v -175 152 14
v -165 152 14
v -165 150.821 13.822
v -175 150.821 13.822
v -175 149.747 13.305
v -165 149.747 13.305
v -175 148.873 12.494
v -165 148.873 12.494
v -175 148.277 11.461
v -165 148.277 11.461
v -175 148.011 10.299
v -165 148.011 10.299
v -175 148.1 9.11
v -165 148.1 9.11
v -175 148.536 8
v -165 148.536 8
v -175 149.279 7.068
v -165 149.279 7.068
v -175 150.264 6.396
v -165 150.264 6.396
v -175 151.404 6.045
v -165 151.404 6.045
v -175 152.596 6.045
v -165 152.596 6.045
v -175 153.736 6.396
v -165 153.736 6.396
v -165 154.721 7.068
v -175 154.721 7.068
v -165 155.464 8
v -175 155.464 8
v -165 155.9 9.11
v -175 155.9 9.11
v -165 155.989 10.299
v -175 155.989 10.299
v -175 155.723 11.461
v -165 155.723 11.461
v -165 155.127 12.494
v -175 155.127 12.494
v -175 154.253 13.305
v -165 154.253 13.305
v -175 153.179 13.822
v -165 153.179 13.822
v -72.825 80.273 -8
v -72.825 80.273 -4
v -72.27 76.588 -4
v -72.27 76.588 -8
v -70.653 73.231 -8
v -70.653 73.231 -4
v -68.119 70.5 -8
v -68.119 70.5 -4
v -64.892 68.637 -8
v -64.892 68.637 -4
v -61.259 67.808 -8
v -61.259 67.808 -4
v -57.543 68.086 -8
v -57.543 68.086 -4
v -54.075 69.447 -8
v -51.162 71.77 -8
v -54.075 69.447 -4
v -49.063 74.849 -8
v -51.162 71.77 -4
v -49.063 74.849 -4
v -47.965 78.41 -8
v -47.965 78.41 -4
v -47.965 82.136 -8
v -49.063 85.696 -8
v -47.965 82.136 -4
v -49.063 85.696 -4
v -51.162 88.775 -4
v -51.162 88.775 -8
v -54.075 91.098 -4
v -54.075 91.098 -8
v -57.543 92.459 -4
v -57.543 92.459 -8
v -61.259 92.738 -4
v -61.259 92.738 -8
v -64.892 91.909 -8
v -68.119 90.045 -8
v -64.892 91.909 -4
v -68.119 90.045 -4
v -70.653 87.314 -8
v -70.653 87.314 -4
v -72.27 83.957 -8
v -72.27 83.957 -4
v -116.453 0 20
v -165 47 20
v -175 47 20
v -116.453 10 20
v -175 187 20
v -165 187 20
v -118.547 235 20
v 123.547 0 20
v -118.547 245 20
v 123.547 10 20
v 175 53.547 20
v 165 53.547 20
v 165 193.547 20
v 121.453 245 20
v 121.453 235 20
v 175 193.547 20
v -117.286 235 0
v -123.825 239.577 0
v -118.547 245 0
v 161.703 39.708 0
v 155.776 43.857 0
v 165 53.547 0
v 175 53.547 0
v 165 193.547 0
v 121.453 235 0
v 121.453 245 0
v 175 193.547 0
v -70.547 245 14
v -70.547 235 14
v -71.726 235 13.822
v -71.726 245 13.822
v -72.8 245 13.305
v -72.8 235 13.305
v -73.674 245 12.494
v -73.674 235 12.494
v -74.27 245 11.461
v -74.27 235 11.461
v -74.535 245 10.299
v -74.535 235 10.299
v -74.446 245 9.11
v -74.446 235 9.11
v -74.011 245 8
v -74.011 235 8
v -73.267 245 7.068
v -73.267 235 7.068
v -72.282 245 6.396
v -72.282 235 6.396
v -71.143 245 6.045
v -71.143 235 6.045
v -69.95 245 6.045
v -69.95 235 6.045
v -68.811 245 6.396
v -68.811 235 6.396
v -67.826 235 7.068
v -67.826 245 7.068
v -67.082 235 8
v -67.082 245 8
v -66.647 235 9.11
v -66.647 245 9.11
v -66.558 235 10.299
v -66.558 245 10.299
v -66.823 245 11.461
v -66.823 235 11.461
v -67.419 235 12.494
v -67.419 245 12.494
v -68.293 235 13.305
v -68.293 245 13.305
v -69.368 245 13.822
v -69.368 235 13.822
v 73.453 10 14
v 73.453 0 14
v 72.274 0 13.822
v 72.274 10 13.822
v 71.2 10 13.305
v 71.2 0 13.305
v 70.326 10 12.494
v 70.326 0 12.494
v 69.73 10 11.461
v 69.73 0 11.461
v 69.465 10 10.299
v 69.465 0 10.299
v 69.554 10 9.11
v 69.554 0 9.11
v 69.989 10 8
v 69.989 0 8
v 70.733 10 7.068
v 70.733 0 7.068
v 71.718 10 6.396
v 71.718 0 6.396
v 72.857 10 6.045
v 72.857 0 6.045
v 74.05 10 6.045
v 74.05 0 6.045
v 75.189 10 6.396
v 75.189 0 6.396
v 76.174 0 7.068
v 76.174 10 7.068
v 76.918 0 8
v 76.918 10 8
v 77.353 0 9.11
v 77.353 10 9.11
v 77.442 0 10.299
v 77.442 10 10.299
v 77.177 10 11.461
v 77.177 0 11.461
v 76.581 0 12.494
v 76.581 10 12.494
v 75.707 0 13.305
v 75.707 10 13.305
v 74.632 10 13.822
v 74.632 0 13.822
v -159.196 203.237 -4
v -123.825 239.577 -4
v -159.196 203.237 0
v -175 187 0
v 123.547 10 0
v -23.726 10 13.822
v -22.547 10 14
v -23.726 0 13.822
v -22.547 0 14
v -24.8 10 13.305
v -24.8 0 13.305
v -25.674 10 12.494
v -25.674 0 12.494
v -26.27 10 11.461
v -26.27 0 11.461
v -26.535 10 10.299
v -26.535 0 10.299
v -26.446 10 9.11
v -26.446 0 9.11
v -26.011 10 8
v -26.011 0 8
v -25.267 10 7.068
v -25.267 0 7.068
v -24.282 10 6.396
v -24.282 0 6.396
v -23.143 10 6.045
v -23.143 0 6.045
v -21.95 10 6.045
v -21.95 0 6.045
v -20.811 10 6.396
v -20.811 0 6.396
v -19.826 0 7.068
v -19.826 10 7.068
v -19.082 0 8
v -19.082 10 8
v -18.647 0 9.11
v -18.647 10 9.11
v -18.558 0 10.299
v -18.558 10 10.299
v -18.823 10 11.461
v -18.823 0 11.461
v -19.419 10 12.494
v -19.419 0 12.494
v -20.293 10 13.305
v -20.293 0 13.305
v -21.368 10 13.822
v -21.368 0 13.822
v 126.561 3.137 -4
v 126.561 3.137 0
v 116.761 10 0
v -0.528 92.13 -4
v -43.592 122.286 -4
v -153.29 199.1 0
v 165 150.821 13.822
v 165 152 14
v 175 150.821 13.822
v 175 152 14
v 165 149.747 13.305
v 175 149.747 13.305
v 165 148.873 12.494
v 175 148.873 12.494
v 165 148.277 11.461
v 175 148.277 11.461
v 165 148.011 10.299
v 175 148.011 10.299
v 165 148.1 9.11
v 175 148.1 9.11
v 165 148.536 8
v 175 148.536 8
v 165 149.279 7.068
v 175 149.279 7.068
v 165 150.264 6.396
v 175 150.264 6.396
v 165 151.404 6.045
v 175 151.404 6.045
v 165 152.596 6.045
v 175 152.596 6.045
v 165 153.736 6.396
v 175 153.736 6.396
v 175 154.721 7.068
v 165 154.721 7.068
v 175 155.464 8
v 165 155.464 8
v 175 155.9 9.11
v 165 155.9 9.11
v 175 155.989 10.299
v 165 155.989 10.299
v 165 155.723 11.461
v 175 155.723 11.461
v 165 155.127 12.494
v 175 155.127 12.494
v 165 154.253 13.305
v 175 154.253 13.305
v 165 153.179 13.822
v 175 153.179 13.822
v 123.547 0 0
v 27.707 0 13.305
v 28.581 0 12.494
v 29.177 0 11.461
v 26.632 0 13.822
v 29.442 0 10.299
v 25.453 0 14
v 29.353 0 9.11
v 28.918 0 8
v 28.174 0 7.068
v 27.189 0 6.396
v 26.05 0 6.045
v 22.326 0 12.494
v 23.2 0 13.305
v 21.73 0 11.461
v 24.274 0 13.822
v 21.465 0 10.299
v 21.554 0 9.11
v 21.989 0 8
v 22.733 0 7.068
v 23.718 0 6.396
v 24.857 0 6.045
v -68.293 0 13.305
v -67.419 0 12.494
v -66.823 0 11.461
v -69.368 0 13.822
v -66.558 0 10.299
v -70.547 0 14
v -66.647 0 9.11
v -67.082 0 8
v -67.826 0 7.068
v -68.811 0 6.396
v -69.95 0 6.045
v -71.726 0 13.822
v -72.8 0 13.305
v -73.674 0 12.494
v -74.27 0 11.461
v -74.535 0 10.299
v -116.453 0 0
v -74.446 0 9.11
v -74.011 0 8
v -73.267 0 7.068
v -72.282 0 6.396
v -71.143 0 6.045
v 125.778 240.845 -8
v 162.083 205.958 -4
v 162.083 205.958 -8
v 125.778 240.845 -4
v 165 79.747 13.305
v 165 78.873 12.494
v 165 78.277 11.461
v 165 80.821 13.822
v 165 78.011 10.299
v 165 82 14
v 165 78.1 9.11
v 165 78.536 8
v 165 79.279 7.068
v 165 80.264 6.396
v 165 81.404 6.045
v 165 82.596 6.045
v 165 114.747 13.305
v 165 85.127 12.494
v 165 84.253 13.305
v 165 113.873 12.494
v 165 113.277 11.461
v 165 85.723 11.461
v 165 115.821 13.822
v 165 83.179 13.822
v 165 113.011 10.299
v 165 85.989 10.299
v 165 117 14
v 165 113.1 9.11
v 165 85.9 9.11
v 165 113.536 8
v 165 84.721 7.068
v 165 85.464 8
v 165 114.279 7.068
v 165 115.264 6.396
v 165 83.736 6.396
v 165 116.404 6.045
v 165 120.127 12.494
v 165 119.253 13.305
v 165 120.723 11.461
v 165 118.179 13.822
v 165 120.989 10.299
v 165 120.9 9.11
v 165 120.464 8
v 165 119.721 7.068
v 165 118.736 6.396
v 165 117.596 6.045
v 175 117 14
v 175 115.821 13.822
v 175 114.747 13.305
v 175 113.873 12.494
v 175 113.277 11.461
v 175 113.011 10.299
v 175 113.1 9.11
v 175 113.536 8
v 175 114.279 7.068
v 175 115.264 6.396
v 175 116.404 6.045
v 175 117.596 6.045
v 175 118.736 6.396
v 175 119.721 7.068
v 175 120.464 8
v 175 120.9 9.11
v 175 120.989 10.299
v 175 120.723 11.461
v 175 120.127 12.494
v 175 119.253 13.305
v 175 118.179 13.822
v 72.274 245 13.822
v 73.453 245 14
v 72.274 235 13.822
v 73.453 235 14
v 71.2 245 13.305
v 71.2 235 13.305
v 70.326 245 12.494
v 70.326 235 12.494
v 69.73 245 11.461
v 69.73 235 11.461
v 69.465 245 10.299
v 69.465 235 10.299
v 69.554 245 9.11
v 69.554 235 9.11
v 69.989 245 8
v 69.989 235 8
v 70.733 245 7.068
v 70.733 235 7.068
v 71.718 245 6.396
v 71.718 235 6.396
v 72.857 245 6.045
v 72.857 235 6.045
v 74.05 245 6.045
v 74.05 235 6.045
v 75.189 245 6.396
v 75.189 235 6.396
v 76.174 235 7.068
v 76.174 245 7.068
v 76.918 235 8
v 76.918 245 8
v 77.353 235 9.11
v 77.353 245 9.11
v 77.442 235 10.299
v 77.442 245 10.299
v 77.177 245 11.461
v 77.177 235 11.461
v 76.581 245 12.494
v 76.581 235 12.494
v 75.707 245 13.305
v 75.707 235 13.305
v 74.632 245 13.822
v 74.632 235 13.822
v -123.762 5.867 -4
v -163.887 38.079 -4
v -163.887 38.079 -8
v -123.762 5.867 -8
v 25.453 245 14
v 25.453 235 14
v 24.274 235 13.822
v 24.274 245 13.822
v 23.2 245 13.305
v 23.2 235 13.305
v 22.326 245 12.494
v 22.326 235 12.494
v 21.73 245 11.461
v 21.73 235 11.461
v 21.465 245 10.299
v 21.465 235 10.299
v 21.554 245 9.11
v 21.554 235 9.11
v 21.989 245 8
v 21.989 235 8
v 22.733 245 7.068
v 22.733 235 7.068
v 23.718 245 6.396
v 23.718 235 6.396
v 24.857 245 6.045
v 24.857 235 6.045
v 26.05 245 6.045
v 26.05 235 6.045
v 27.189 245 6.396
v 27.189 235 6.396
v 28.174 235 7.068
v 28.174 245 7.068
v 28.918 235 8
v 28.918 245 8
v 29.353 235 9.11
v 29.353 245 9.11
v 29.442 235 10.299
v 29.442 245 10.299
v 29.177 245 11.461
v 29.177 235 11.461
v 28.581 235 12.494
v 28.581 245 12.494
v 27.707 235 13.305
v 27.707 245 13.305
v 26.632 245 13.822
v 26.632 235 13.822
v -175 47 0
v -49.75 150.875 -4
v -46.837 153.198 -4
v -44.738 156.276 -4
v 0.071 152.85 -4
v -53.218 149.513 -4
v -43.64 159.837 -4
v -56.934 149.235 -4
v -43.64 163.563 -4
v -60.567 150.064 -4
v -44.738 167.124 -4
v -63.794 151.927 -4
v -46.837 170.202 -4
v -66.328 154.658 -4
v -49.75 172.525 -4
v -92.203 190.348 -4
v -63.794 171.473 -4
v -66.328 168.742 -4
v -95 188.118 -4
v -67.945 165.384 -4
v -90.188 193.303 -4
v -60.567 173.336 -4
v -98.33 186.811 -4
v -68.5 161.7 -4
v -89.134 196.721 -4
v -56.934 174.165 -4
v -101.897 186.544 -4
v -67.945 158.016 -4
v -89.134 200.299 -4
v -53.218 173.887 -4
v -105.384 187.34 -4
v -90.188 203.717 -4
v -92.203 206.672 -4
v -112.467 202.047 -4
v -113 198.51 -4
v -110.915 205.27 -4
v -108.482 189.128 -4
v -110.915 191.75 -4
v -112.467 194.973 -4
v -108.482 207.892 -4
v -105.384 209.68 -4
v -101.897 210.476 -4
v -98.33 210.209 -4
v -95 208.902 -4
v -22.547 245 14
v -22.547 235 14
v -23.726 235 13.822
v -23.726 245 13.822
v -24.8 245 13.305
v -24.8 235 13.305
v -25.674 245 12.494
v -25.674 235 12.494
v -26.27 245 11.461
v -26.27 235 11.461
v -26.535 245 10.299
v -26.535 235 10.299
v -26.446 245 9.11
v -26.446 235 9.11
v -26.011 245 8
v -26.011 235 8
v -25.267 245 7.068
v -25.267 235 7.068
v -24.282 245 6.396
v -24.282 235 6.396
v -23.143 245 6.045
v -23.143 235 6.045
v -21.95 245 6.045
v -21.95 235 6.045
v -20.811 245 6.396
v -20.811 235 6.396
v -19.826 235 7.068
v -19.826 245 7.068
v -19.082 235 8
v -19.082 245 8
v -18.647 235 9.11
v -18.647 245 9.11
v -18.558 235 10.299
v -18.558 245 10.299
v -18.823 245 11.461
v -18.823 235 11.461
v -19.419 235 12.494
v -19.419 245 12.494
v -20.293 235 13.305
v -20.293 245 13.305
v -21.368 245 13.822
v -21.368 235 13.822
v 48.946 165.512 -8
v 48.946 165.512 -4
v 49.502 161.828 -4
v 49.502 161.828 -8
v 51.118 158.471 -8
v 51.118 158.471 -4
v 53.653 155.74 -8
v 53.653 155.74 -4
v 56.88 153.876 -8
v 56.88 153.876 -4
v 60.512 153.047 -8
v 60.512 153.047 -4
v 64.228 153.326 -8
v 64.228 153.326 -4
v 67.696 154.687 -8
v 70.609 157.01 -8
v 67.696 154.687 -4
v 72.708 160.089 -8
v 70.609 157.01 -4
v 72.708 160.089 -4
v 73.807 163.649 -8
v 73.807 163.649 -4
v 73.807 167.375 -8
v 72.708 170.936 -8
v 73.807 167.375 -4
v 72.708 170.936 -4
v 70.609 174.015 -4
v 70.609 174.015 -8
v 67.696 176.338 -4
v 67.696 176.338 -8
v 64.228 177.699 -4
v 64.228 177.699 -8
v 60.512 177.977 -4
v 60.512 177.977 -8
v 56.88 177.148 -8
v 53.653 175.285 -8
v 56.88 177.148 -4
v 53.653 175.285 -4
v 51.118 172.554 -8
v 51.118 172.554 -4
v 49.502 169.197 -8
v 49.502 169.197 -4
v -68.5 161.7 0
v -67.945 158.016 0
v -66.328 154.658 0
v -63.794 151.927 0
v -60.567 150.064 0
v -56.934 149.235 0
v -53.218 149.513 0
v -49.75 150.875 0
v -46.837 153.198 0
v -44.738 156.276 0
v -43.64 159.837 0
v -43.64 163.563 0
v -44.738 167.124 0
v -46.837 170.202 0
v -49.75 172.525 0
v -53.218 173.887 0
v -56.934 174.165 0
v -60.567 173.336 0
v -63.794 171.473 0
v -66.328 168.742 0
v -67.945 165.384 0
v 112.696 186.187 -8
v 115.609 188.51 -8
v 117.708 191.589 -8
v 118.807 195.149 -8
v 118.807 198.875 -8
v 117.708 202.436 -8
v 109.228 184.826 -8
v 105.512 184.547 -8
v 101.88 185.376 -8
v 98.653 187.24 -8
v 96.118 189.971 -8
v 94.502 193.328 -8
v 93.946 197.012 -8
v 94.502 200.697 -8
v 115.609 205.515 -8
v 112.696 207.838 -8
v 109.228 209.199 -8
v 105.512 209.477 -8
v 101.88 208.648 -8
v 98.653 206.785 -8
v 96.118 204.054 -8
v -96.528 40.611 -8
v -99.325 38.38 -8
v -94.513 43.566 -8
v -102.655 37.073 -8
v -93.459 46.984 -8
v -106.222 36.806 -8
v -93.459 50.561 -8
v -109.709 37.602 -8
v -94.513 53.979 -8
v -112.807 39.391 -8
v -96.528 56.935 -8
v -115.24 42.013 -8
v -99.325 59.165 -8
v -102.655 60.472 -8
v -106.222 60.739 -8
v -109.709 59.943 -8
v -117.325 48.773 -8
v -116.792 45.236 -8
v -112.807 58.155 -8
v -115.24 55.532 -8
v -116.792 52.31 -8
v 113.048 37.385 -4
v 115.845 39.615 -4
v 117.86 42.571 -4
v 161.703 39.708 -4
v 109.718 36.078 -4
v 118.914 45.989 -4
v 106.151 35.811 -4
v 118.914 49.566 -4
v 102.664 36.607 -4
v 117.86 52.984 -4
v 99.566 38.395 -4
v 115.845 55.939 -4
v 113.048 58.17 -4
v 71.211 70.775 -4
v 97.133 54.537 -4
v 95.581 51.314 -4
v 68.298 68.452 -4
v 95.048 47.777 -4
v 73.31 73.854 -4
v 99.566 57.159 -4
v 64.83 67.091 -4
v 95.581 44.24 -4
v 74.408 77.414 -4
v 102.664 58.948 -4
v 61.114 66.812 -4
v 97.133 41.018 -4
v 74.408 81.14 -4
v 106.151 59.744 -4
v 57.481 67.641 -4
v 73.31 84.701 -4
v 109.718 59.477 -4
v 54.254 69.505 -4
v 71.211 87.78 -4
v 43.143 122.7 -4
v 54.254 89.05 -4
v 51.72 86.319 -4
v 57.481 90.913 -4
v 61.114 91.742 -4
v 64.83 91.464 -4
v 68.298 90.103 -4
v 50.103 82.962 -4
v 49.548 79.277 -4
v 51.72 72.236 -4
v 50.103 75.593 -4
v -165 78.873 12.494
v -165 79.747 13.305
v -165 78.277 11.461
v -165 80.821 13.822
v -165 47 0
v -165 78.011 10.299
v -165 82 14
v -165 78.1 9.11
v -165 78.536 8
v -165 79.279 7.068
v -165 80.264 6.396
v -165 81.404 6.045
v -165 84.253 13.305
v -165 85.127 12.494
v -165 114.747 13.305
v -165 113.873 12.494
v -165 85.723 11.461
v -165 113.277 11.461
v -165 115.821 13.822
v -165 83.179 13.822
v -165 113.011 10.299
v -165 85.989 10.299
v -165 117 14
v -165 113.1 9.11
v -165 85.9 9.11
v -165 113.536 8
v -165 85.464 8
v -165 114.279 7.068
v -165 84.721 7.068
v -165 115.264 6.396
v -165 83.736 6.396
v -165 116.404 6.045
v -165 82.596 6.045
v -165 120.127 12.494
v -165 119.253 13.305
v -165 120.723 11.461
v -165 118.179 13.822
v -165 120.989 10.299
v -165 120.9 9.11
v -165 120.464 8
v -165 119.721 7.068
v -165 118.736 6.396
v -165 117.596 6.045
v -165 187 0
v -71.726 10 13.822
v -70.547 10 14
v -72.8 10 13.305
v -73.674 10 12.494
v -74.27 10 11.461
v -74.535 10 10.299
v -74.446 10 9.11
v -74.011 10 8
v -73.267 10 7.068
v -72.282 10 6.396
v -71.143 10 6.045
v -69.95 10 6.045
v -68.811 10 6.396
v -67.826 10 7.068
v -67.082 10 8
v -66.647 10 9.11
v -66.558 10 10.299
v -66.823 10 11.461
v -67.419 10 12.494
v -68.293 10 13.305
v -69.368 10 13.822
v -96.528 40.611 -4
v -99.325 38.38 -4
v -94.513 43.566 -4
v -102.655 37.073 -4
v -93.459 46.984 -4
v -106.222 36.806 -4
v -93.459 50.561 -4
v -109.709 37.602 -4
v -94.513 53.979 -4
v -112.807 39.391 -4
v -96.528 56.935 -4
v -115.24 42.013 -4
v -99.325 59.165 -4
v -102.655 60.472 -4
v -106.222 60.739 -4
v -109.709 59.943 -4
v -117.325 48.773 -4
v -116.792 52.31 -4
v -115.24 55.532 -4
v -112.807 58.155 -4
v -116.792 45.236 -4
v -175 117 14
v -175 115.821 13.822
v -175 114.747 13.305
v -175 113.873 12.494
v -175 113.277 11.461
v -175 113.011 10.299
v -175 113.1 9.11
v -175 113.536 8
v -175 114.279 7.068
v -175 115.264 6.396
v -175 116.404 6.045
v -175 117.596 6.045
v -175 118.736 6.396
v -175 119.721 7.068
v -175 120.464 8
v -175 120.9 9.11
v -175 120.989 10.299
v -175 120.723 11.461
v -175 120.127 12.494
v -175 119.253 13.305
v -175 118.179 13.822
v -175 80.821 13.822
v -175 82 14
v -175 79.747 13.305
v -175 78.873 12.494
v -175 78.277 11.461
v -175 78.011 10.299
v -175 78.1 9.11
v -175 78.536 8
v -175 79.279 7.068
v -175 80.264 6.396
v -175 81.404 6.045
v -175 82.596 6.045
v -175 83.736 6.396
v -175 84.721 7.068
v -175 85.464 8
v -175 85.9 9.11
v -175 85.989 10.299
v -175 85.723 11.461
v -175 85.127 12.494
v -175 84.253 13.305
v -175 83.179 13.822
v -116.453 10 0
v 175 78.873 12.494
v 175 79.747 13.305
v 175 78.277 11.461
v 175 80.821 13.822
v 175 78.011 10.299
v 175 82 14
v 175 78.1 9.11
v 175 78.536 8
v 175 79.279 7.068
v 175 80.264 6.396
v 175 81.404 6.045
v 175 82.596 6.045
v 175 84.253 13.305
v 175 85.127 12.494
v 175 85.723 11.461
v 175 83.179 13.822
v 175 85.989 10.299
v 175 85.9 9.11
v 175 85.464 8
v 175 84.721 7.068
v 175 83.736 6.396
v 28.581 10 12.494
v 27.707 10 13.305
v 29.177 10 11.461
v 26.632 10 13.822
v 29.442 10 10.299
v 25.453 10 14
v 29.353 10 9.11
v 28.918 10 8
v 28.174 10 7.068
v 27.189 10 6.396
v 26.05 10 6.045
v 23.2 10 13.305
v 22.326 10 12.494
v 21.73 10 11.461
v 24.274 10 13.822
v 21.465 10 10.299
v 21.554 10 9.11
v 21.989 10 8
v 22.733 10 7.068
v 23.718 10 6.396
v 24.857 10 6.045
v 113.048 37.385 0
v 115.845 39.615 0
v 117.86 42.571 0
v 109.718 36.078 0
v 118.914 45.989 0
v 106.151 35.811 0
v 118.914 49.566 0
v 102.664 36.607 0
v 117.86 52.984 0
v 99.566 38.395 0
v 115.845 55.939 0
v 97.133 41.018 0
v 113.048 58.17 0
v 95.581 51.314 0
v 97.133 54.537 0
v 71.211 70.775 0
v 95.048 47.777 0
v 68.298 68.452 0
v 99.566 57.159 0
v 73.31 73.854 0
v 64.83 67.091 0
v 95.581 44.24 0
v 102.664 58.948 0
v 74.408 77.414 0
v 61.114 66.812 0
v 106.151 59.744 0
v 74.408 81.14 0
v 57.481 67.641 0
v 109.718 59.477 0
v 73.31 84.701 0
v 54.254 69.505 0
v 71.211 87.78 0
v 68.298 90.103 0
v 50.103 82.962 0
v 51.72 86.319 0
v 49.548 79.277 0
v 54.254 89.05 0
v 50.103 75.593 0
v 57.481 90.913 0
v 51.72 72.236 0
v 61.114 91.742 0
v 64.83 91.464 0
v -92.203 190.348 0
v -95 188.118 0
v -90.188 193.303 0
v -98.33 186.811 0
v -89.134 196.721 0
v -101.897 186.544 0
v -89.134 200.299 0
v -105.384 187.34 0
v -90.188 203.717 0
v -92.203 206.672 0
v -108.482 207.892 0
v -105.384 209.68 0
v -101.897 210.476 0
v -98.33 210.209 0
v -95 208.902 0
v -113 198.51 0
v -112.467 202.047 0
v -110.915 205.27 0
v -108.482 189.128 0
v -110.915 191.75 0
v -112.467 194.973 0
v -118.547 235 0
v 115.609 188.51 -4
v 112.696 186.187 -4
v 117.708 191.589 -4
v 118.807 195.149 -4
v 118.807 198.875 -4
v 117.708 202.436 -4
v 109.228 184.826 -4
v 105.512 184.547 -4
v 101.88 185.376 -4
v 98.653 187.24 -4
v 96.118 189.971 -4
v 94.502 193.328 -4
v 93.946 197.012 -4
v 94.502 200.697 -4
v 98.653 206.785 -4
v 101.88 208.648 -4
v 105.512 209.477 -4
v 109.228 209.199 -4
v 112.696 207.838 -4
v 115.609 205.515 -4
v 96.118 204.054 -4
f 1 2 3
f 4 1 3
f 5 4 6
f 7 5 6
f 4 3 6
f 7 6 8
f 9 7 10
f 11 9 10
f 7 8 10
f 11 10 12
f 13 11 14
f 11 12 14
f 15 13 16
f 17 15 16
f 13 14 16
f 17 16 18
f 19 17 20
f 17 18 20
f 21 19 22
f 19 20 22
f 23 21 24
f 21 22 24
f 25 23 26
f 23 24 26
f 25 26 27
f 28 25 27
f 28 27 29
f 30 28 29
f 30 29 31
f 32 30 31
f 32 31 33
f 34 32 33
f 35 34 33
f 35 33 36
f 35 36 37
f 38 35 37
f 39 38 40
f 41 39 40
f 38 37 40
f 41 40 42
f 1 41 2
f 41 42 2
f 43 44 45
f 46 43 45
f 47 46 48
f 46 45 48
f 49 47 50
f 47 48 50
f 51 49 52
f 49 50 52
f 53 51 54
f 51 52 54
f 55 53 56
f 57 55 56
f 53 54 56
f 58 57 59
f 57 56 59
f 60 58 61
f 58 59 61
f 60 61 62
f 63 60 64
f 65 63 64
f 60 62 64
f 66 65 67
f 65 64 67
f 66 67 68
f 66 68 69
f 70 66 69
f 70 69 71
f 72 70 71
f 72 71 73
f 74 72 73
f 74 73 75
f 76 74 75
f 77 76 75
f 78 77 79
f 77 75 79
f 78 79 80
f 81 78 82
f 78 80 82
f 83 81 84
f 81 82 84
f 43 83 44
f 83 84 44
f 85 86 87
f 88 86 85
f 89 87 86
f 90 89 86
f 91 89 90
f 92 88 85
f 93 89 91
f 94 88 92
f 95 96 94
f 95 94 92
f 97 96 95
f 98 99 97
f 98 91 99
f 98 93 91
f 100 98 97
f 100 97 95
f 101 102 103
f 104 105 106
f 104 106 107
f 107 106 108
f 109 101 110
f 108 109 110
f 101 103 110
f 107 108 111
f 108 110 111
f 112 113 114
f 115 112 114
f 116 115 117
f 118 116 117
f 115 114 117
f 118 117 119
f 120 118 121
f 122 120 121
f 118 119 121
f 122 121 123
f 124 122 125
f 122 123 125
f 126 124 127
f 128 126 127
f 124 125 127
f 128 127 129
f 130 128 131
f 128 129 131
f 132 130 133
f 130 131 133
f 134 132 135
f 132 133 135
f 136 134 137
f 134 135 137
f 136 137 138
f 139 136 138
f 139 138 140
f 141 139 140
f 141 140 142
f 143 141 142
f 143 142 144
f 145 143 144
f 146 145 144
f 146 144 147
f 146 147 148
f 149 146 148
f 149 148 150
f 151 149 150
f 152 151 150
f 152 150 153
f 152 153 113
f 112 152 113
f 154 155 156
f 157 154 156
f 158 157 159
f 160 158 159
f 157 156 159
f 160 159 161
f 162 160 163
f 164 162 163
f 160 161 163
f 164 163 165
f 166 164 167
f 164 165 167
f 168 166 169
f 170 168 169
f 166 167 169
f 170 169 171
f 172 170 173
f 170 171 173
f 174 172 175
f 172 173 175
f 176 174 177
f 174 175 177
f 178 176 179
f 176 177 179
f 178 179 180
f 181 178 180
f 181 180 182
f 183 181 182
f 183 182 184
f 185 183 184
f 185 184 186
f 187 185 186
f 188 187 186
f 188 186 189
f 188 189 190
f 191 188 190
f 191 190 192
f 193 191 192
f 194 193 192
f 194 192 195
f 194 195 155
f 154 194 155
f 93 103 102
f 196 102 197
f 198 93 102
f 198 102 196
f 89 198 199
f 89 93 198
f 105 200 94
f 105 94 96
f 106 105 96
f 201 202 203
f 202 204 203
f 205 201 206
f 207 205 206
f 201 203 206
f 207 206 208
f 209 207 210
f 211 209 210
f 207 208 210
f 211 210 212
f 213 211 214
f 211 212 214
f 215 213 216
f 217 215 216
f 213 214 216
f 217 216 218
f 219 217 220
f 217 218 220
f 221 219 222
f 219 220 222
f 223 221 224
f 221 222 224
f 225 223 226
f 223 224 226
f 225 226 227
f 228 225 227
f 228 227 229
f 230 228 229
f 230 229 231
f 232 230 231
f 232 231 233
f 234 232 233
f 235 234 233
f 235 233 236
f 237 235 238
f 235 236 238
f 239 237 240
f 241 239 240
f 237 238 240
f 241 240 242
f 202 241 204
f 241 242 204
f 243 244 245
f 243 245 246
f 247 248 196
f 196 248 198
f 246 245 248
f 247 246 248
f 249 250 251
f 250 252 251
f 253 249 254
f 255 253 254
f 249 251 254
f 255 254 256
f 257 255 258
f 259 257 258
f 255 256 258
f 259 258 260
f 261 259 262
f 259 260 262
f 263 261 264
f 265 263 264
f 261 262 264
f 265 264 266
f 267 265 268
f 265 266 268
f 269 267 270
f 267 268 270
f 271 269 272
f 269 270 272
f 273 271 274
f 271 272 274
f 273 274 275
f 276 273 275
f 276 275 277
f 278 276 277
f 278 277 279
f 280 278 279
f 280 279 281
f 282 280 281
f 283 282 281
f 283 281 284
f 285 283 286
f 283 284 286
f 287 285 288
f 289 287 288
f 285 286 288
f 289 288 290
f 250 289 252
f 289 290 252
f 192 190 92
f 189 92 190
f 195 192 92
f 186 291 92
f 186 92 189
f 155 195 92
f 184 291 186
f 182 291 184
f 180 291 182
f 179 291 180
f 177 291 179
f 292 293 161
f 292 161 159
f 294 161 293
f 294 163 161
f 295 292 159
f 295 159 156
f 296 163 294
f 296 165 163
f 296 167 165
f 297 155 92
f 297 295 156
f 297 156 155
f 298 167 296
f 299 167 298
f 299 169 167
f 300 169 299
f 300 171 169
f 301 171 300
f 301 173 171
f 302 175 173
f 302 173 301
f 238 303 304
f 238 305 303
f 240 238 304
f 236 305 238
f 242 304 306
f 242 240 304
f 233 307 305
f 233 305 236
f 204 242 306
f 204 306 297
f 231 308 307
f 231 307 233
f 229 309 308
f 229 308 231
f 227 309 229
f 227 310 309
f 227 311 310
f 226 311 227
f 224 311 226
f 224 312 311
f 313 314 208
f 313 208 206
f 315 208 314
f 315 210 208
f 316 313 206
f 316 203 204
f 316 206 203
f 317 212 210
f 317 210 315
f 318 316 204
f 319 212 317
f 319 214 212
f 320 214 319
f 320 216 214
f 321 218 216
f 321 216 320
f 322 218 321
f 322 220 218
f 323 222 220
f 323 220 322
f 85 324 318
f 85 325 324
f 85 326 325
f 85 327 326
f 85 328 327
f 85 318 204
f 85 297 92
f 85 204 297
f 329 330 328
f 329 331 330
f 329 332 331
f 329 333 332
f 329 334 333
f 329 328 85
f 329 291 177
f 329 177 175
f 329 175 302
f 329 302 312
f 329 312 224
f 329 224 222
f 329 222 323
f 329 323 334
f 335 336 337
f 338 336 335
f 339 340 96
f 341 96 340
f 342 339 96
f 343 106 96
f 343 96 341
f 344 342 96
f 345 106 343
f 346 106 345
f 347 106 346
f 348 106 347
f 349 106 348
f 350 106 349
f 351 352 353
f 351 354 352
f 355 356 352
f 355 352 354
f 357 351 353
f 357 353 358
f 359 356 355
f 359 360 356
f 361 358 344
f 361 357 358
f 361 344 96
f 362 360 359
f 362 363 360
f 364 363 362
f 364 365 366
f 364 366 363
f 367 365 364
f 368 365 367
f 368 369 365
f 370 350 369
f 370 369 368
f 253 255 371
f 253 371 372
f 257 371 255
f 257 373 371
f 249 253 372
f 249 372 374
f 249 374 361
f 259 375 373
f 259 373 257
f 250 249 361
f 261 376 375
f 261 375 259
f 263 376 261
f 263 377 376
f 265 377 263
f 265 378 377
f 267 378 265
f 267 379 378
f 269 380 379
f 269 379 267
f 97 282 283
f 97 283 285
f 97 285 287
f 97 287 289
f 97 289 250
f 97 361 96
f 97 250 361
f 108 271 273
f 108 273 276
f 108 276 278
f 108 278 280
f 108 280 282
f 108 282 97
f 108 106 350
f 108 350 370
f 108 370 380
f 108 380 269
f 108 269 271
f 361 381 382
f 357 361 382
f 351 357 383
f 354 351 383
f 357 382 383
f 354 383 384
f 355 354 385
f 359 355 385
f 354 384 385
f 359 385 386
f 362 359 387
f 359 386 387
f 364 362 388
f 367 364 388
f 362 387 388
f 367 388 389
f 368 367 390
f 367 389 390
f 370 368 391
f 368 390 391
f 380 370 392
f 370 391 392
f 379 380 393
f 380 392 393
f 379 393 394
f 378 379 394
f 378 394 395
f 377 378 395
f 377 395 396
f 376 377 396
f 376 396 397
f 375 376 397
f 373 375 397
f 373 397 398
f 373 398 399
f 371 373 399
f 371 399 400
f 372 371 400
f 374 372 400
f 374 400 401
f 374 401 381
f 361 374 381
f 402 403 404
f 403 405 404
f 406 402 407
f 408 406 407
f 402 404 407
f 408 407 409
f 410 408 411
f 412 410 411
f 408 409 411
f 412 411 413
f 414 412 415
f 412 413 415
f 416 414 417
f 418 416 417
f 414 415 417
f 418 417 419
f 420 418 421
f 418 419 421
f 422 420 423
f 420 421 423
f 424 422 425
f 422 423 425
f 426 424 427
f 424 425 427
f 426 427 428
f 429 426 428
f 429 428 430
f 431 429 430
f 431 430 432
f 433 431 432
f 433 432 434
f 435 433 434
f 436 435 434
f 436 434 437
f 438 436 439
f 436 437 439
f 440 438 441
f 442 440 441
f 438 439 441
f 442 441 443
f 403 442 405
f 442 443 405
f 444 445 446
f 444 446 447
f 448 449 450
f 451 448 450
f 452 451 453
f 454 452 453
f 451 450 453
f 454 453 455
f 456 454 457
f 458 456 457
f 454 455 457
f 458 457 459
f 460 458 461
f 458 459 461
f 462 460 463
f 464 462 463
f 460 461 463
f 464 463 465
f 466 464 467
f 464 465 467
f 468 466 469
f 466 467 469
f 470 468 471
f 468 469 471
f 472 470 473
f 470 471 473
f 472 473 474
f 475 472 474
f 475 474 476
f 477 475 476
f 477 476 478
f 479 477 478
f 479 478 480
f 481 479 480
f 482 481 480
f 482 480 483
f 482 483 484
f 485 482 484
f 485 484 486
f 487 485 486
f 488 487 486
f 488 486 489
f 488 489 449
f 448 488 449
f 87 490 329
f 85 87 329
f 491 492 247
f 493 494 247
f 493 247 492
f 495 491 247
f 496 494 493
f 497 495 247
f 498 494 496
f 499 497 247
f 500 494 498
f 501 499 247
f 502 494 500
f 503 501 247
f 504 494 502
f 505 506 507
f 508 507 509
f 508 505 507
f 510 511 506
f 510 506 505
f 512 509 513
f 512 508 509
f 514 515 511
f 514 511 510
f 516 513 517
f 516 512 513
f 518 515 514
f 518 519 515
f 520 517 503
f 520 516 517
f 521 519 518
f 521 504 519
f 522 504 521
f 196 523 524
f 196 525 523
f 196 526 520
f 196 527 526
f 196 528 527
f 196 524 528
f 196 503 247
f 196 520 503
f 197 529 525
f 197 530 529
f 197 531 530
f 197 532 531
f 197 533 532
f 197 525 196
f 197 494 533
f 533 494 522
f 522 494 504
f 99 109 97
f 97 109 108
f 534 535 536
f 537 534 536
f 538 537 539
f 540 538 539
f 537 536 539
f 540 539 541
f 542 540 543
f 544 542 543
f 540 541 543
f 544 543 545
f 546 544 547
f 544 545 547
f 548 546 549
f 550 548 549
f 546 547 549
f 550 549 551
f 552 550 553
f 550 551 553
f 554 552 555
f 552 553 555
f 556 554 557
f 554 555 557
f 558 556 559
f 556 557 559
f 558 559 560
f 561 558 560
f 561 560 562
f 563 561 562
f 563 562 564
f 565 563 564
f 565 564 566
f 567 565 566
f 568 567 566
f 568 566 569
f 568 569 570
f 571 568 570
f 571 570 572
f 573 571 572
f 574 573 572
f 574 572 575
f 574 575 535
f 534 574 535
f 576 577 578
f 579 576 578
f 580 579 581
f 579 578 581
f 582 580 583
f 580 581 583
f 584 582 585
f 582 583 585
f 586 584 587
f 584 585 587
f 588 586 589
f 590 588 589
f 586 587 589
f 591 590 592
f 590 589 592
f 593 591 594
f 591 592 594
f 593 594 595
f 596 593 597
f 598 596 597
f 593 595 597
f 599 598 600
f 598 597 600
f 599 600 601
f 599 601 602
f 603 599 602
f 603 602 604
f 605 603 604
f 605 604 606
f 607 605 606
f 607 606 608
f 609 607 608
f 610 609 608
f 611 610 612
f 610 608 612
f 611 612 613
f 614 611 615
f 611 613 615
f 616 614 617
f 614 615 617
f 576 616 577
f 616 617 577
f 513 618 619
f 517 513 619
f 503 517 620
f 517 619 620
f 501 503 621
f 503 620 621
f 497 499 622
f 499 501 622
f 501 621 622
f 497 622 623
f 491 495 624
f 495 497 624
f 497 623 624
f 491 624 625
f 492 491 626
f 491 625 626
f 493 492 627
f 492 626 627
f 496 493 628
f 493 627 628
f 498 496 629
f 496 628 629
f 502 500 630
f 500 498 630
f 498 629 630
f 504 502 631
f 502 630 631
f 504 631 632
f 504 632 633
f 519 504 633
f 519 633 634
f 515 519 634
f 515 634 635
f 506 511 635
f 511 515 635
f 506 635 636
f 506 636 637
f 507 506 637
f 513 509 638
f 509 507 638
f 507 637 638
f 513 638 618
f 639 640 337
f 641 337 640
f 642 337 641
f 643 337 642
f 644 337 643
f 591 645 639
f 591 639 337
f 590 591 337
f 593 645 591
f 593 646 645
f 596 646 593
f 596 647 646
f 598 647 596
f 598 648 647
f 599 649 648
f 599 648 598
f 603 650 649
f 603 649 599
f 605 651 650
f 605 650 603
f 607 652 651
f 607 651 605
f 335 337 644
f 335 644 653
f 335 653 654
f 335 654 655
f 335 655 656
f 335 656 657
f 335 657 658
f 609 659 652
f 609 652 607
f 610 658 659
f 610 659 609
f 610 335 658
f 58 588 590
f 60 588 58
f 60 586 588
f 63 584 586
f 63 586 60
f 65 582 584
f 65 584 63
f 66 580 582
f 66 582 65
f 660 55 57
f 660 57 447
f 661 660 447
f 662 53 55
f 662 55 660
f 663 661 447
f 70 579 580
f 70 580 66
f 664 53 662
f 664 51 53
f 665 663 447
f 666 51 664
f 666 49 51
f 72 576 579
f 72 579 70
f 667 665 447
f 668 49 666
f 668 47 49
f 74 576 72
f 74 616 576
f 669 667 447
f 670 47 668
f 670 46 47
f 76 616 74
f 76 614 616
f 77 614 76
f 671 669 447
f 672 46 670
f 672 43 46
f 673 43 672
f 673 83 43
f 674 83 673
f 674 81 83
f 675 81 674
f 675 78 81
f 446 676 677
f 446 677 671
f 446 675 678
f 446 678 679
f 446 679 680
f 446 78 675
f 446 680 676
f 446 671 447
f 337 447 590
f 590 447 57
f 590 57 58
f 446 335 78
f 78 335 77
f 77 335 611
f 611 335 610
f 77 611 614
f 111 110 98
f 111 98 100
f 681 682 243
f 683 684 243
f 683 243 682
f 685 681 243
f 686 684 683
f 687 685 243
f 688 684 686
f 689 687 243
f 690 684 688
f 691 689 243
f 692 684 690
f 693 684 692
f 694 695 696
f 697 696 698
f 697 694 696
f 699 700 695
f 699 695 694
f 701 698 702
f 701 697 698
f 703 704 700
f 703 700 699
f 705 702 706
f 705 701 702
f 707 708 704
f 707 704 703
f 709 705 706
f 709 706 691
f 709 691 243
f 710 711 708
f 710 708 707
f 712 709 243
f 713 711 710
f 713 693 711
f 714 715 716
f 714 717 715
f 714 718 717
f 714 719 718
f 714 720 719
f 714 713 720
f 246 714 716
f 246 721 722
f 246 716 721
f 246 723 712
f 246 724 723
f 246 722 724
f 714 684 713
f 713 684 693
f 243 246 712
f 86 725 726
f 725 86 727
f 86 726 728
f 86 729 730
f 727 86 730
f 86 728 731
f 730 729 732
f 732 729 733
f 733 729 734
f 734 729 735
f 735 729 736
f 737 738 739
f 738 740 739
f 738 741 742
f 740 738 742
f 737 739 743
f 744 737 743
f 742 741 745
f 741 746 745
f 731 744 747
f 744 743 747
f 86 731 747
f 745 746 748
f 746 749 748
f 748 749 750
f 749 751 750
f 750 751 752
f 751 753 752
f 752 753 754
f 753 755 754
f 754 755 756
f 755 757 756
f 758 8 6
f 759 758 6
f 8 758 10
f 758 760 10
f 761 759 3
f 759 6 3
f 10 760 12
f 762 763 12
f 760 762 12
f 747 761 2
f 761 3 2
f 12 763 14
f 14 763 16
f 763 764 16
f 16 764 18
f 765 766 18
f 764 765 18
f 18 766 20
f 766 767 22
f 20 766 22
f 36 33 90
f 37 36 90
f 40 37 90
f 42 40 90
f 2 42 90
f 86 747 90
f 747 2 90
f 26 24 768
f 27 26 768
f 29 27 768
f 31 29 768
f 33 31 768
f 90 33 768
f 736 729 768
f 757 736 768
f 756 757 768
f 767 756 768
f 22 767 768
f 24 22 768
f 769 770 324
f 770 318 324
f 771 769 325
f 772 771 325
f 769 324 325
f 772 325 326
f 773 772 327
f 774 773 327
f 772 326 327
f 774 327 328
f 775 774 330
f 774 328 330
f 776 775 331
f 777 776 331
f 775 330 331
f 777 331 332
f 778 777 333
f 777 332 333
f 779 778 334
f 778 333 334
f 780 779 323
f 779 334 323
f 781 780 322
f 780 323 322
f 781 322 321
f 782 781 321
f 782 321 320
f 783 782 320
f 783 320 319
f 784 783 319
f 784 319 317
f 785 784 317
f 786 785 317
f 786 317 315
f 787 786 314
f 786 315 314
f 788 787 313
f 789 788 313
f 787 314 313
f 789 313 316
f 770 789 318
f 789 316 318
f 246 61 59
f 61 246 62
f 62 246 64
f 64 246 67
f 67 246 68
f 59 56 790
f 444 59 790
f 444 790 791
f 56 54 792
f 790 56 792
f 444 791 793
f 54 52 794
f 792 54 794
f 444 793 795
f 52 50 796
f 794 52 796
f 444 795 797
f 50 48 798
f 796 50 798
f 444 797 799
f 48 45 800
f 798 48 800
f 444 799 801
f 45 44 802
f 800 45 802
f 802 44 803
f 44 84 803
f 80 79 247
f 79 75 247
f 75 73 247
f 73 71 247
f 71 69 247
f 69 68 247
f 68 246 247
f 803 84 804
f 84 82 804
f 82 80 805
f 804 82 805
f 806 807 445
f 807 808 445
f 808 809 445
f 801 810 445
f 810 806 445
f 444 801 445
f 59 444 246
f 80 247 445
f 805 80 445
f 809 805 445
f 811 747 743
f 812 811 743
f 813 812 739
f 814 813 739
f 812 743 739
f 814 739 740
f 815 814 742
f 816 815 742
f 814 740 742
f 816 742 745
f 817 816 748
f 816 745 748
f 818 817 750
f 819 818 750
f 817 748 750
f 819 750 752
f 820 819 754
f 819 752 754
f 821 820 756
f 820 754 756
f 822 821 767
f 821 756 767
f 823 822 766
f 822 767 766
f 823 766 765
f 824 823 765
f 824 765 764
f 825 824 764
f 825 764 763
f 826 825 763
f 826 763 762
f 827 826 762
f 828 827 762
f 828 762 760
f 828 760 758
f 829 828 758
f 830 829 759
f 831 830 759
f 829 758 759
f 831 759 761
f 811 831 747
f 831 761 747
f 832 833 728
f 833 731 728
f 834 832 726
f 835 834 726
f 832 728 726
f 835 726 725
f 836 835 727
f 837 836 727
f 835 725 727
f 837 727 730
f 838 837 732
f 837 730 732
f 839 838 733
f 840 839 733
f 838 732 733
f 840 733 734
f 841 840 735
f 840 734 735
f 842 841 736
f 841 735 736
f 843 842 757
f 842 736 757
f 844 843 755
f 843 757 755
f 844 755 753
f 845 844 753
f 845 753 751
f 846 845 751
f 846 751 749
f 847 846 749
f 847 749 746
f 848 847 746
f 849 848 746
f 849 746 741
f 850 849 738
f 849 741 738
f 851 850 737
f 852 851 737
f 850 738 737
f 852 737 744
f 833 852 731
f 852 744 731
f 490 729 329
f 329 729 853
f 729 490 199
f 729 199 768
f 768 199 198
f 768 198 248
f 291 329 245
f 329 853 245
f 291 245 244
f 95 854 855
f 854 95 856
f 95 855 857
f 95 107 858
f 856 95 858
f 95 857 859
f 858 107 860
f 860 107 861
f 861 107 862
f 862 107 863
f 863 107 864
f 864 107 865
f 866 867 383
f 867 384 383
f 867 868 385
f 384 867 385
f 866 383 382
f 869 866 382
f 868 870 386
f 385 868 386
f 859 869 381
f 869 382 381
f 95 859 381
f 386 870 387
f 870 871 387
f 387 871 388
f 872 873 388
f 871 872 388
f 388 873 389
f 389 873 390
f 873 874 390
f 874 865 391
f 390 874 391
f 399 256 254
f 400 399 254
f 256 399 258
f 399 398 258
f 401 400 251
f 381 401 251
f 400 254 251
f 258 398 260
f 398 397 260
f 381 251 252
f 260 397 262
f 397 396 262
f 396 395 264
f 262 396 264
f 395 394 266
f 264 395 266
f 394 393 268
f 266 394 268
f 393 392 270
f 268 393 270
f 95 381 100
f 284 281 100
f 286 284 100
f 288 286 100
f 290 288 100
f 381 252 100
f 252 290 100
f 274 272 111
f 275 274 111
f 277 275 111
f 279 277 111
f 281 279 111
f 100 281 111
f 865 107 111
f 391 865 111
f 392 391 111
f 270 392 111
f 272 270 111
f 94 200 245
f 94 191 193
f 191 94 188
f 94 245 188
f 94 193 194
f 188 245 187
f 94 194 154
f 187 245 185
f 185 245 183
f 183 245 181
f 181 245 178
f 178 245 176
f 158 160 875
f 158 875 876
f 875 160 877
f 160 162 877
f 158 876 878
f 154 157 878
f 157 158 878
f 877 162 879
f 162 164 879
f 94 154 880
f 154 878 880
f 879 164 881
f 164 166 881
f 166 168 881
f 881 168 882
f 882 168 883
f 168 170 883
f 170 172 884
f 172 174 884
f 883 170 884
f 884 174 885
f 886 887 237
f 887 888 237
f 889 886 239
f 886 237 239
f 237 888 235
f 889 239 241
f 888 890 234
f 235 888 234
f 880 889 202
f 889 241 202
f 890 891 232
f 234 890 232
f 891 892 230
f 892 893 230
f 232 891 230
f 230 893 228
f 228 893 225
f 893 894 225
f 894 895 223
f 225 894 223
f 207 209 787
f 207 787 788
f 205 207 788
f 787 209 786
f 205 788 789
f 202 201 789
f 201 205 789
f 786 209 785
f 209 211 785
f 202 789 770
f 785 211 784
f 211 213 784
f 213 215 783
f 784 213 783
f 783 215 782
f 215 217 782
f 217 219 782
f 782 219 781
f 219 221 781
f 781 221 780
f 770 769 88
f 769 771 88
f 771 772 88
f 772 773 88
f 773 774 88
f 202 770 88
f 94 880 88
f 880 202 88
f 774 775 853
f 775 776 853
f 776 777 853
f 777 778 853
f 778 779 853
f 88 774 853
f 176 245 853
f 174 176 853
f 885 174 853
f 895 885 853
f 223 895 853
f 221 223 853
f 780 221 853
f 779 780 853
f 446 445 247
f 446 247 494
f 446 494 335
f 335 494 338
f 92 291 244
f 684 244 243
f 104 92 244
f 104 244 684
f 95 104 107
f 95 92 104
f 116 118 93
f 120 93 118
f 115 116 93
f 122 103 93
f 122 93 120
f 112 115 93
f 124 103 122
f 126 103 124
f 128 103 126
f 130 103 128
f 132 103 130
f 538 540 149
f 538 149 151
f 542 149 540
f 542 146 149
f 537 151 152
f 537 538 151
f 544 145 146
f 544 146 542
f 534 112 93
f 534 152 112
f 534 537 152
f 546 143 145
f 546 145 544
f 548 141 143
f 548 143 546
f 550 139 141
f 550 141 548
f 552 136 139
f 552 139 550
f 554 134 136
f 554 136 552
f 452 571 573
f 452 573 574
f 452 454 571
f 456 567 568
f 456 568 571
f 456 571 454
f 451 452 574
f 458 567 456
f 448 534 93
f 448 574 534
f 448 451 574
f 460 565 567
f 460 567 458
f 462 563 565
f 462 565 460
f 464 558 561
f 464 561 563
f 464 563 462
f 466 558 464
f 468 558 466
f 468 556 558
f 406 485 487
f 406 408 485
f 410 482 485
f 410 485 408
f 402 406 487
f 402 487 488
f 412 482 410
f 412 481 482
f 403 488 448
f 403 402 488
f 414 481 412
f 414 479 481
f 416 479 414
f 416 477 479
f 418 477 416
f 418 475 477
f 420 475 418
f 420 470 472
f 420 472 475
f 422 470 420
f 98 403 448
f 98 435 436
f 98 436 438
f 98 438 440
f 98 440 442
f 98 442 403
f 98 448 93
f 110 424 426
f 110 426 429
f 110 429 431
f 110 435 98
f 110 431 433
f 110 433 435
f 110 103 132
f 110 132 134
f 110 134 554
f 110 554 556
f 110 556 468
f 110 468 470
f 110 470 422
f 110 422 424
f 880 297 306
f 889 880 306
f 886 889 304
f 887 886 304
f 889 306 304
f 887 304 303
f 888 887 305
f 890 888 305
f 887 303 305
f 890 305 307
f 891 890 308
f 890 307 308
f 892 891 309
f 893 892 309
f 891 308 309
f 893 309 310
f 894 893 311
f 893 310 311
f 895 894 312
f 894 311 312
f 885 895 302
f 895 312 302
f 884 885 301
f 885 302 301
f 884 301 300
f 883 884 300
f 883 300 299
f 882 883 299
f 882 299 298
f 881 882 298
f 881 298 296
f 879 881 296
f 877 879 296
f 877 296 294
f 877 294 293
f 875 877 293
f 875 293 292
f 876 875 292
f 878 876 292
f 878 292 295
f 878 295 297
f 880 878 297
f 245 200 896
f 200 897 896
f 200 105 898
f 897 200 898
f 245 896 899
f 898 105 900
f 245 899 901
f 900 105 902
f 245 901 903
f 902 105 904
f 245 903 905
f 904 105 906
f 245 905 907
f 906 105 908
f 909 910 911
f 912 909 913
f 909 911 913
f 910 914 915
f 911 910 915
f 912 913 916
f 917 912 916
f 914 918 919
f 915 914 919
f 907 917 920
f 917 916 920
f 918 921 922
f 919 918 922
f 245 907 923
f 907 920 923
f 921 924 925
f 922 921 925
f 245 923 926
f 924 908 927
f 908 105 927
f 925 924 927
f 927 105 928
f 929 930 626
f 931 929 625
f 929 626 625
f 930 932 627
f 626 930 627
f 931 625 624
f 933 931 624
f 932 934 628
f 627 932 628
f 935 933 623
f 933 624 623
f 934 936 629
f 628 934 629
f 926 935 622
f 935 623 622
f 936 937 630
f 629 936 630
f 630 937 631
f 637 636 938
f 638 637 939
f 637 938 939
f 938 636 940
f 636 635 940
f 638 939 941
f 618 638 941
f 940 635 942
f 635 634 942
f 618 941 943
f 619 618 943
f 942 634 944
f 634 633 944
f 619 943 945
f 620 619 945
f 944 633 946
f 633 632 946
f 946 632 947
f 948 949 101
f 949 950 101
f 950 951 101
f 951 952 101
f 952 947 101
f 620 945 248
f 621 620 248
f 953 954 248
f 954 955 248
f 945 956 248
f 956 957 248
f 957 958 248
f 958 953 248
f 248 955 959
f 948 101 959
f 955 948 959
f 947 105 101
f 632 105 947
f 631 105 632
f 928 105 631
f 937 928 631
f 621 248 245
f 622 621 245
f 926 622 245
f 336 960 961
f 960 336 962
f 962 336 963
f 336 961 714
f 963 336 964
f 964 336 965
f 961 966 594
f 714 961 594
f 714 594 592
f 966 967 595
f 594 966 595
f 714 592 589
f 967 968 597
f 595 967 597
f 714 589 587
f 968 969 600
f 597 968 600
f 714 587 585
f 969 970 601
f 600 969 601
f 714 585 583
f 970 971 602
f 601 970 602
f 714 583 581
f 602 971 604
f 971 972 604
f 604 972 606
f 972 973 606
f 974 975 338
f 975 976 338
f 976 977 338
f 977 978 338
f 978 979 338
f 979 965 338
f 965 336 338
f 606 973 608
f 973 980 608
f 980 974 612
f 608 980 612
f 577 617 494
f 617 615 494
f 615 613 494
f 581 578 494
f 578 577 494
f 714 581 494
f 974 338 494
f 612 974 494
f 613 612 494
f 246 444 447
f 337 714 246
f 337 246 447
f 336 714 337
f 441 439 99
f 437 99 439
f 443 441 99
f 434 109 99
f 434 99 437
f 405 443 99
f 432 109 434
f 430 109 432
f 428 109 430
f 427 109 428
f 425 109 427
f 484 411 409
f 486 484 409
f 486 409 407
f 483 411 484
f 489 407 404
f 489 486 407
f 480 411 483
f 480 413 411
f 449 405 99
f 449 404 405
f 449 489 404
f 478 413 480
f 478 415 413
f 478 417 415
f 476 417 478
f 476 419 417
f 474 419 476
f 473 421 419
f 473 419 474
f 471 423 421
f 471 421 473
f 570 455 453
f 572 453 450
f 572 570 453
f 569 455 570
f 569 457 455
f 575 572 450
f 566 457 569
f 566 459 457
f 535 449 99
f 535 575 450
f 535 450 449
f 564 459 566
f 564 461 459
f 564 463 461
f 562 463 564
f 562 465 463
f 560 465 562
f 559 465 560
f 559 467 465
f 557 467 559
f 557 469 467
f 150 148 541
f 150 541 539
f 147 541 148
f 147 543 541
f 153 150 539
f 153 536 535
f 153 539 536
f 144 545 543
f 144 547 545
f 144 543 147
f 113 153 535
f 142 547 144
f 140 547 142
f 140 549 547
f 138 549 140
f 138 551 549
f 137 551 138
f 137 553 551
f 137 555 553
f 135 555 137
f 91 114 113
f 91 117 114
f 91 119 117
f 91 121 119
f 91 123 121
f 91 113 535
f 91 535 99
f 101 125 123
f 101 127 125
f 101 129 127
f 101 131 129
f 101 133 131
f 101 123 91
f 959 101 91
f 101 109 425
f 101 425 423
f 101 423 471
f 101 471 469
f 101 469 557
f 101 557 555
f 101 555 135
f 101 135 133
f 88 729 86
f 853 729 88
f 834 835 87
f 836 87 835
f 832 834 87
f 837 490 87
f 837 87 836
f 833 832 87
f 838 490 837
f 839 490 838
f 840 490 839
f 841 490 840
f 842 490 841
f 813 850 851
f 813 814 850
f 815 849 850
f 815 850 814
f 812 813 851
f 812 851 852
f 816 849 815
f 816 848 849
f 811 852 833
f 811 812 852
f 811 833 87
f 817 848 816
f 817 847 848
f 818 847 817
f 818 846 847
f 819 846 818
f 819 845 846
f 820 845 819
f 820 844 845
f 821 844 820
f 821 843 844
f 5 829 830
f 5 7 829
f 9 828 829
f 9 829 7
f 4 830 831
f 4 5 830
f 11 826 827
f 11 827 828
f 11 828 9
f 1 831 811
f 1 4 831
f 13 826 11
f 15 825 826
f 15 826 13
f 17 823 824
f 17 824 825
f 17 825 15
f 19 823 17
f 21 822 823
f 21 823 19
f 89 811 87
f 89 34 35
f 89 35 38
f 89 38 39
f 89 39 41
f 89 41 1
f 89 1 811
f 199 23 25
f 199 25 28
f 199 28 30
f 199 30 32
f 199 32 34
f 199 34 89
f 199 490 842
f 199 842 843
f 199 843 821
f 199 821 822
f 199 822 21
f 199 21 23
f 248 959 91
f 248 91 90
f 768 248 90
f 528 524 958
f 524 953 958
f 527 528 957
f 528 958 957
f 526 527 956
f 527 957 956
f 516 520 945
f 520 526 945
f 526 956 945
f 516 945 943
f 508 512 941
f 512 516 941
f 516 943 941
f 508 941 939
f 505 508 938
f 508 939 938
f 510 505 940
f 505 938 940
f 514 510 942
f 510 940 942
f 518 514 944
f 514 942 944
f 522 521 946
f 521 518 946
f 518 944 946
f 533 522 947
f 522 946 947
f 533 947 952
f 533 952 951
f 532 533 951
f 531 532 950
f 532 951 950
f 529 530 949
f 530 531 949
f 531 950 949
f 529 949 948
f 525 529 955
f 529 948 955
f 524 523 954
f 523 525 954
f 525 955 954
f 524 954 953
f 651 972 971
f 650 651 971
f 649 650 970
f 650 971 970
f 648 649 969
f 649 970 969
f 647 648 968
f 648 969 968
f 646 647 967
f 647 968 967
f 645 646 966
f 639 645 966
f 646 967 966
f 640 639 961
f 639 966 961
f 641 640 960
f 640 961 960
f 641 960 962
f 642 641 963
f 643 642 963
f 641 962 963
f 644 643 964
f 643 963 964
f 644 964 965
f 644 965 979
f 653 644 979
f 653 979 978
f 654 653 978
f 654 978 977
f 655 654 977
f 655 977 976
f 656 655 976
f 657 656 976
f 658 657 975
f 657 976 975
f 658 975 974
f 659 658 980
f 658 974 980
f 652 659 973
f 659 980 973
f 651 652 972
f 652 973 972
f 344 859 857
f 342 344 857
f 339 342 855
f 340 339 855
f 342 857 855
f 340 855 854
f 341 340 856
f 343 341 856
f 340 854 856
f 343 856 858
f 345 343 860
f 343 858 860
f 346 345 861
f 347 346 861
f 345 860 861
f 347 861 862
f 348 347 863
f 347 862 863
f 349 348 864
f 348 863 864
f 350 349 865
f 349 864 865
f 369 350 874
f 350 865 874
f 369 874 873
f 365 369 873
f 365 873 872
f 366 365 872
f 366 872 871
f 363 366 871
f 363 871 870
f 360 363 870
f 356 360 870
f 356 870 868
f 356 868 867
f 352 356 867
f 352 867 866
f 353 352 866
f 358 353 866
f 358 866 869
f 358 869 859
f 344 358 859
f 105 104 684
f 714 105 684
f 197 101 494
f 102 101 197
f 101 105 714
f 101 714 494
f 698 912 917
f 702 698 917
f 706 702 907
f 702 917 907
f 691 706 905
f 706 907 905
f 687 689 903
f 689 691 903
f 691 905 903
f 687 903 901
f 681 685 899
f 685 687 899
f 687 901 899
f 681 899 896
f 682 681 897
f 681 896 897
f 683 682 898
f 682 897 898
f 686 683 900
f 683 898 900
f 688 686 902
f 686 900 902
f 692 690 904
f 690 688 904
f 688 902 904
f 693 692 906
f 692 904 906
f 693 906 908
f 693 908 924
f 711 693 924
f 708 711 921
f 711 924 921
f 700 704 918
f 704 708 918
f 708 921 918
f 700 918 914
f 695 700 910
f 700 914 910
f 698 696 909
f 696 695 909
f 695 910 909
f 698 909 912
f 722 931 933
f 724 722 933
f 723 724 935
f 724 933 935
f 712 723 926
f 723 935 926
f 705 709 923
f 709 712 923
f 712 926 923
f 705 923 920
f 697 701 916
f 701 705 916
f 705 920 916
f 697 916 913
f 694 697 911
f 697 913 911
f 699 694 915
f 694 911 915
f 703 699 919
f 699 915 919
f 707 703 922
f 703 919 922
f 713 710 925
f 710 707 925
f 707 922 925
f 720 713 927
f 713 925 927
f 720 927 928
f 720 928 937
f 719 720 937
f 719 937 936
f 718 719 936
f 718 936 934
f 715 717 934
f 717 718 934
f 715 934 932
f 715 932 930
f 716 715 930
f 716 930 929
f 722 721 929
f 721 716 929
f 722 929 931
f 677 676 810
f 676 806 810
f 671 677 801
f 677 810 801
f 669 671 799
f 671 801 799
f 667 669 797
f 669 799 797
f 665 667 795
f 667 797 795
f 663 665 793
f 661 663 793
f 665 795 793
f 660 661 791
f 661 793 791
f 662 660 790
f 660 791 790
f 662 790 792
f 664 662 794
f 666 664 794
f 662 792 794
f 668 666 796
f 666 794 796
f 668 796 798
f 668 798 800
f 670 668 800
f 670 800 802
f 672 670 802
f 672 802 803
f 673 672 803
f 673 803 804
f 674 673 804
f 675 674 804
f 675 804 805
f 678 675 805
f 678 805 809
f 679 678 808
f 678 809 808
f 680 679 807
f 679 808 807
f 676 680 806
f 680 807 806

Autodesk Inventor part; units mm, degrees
ref_plane "YZ Plane" through (0, 0, 0) normal (1, 0, 0) x (0, 1, 0)
sketch "Sketch1" plane through (0, 0, 0) normal (0, 0, 1) x (1, 0, 0)
  line L0 (0, 0) -> (-116.4534, 0)
  line L1 (-175, 47) -> (-175, 187)
  line L2 (-118.5466, 245) -> (0, 245)
  line L3 (0, 245) -> (0, 0) construction
  line L4 (-118.5466, 235) -> (-9, 235)
  line L5 (-9, 10) -> (-116.4534, 10)
  line L6 (-165, 47) -> (-165, 187)
  line L7 (0, 0) -> (123.5466, 0)
  line L8 (175, 53.5466) -> (175, 193.5466)
  line L9 (121.4534, 245) -> (0, 245)
  line L10 (121.4534, 235) -> (9, 235)
  line L11 (9, 10) -> (123.5466, 10)
  line L12 (165, 53.5466) -> (165, 193.5466)
  line L13 (-9, 235) -> (9, 235)
  line L14 (-9, 10) -> (9, 10)
  line L15 (-175, 187) -> (-118.5466, 245)
  line L16 (-175, 47) -> (-116.4534, 0)
  line L17 (121.4534, 245) -> (175, 193.5466)
  line L18 (175, 53.5466) -> (123.5466, 0)
  line L19 (-175, 47) -> (-165, 47)
  line L20 (-116.4534, 10) -> (-116.4534, 0)
  line L21 (-118.5466, 245) -> (-118.5466, 235)
  line L22 (-175, 187) -> (-165, 187)
  line L23 (-118.5466, 235) -> (-165, 187)
  line L24 (-165, 47) -> (-116.4534, 10)
  line L25 (121.4534, 245) -> (121.4534, 235)
  line L26 (175, 193.5466) -> (165, 193.5466)
  line L27 (121.4534, 235) -> (165, 193.5466)
  line L28 (175, 53.5466) -> (165, 53.5466)
  line L29 (123.5466, 0) -> (123.5466, 10)
  line L30 (123.5466, 10) -> (165, 53.5466)
  point P0 (-175, 245)
  point P1 (-175, 0)
  point P2 (-165, 235)
  point P3 (-165, 10)
  point P4 (175, 245)
  point P5 (175, 0)
  point P6 (165, 235)
  point P7 (165, 10)
  dimension "d0" = 245
  dimension "d1" = 175
  dimension "d4" = 10
  dimension "d7" = 240
  dimension "d9" = 240
  dimension "d10" = 140
  dimension "d12" = 136.142
  dimension "d13" = 133.589
  dimension "d14" = 52.687
  dimension "d15" = 44.062
  dimension "d16" = 44.226
  dimension "d17" = 51.243
  dimension "d18" = 10
  dimension "d19" = 53.5466
  dimension "d20" = 175
  dimension "d21" = 0
  dimension "d22" = 0
  dimension "d23" = 10
  dimension "d24" = 41.4534
  dimension "d25" = 10
  dimension "d26" = 183.5465
  dimension "d27" = 166
  dimension "d28" = 166
extrude "Extrusion1" add sketch "Sketch1" along normal blind 20 contours L0 L20 L5 L14 L11 L29 L7 | L16 L19 L24 L20 | L29 L30 L28 L18 | L1 L22 L6 L19 | L28 L12 L26 L8 | L15 L21 L23 L22 | L26 L27 L25 L17 | L2 L9 L25 L10 L13 L4 L21
ref_plane "Work Plane1" through (0, 0, 0) normal (0, 0, -1) x (-1, 0, 0)
sketch "Sketch2" plane through (0, 0, 0) normal (0, 0, -1) x (-1, 0, 0)
  line L0 (-123.5466, 0) -> (-175, 53.5466) projected
  line L1 (-175, 53.5466) -> (-175, 0)
  line L2 (-175, 0) -> (-123.5466, 0)
  line L3 (175, 187) -> (175, 47) projected
  line L4 (175, 47) -> (175, 0)
  line L5 (116.4534, 0) -> (-123.5466, 0) projected
  line L6 (175, 0) -> (116.4534, 0)
  line L7 (-121.4534, 245) -> (118.5466, 245) projected
  line L8 (118.5466, 245) -> (175, 245)
  line L9 (175, 245) -> (175, 187)
  line L10 (-121.4534, 245) -> (-175, 245)
  line L11 (-175, 245) -> (-175, 193.5466)
  line L12 (-175, 193.5466) -> (-121.4534, 245) projected
  line L13 (-160.5333, -20.6513) -> (189.4198, 224.4003)
  line L14 (-189.2819, 20.4027) -> (160.7181, 265.4027)
  circle A0 centre (101, 198.51) radius 12
  circle A1 centre (56, 161.7) radius 12.5
  circle A2 centre (-107.0481, 47.7774) radius 12
  circle A3 centre (-62.0481, 79.2774) radius 12.5
  line L15 (160.7181, 265.4027) -> (189.4198, 224.4003)
  line L16 (-189.238, 20.3554) -> (-160.5333, -20.6513)
  line L17 (118.5466, 245) -> (175, 187) projected
  point P0 (0, 0)
  point P1 (159.1963, 203.2366)
  point P2 (123.8247, 239.5773)
  point P3 (-161.7026, 39.7082)
  point P4 (-126.5613, 3.1373)
  dimension "d32" = 45
  dimension "d33" = 45
  dimension "d34" = 24
  dimension "d35" = 25
  dimension "d36" = 24
  dimension "d37" = 25
  dimension "d38" = 45
extrude "Extrusion2" add sketch "Sketch2" along normal blind 4 contours L0 L14 L17 L13
ref_plane "Work Plane3" through (0, 0, -4) normal (0, 0, -1) x (-1, 0, 0)
sketch "Sketch4" plane through (0, 0, -4) normal (0, 0, -1) x (-1, 0, 0)
  line L0 (175, 47) -> (116.4534, 0) projected
  line L1 (116.4534, 0) -> (175, 0)
  line L2 (175, 0) -> (175, 47)
  line L3 (175, 187) -> (175, 245)
  line L4 (118.5466, 245) -> (175, 187) projected
  line L5 (175, 245) -> (118.5466, 245)
  line L6 (-175, 193.5466) -> (-121.4534, 245) projected
  line L7 (-121.4534, 245) -> (-175, 245)
  line L8 (-175, 245) -> (-175, 193.5466)
  line L9 (-123.5466, 0) -> (-175, 0)
  line L10 (-175, 0) -> (-175, 53.5466)
  line L11 (175, 0) -> (-175, 245)
  line L12 (160.906, -20.1342) -> (-189.094, 224.8658)
  line L13 (189.2349, 20.3356) -> (-160.7651, 265.3356)
  line L14 (160.906, -20.1342) -> (189.2349, 20.3356)
  line L15 (-189.094, 224.8658) -> (-160.7651, 265.3356)
  circle A0 centre (105.3249, 48.7726) radius 12
  circle A1 centre (60.3249, 80.2726) radius 12.5
  circle A2 centre (-106.4463, 197.0124) radius 12.5
  circle A3 centre (-61.4463, 165.5124) radius 12.5
  point P0 (0, 0)
  point P1 (163.8873, 38.0789)
  point P2 (-125.7779, 240.8446)
  point P3 (-162.0833, 205.9583)
  point P4 (123.7616, 5.8669)
  dimension "d46" = 24.577
  dimension "d47" = 24.8227
  dimension "d48" = 45
  dimension "d50" = 45
  dimension "d51" = 45
  dimension "d52" = 45
  dimension "d55" = 25
  dimension "d56" = 25
  dimension "d59" = 25
  dimension "d60" = 24
extrude "Extrusion3" add sketch "Sketch4" along normal blind 4 contours L0 L11 A0 A1 A3 A2 L6 L13 | L0 L12 L6 L11 A2 A3 A1 A0
sketch "Sketch5" plane through (-118.5466, 245, 0) normal (0, 1, 0) x (1, 0, 0)
  line L0 (240, 0) -> (0, 0) projected
  line L1 (0, 0) -> (0, -20) projected
  point P0 (118.5466, 0)
  point P1 (48, -10)
  point P2 (96, -10)
  point P3 (144, -10)
  point P4 (192, -10)
  dimension "d70" = 10
  dimension "d71" = 48
  dimension "d72" = 48
  dimension "d73" = 48
  dimension "d74" = 48
hole "Hole1" at (-70.5466, 245, 10) at (-22.5466, 245, 10) at (25.4534, 245, 10) at (73.4534, 245, 10) direction (0, -1, 0) diameter 8 end through all
sketch "Sketch6" plane through (-175, 47, 0) normal (-1, 0, 0) x (0, 0, 1)
  line L0 (0, 0) -> (20, 0) projected
  line L1 (0, 140) -> (0, 0) projected
  point P0 (0, -47)
  point P1 (10, 35)
  point P2 (10, 70)
  point P3 (10, 105)
  dimension "d82" = 35
  dimension "d83" = 10
  dimension "d84" = 35
  dimension "d85" = 35
hole "Hole2" at (-175, 82, 10) at (-175, 117, 10) at (-175, 152, 10) direction (1, 0, 0) diameter 8 end through all
properties part number "New Chassis"
